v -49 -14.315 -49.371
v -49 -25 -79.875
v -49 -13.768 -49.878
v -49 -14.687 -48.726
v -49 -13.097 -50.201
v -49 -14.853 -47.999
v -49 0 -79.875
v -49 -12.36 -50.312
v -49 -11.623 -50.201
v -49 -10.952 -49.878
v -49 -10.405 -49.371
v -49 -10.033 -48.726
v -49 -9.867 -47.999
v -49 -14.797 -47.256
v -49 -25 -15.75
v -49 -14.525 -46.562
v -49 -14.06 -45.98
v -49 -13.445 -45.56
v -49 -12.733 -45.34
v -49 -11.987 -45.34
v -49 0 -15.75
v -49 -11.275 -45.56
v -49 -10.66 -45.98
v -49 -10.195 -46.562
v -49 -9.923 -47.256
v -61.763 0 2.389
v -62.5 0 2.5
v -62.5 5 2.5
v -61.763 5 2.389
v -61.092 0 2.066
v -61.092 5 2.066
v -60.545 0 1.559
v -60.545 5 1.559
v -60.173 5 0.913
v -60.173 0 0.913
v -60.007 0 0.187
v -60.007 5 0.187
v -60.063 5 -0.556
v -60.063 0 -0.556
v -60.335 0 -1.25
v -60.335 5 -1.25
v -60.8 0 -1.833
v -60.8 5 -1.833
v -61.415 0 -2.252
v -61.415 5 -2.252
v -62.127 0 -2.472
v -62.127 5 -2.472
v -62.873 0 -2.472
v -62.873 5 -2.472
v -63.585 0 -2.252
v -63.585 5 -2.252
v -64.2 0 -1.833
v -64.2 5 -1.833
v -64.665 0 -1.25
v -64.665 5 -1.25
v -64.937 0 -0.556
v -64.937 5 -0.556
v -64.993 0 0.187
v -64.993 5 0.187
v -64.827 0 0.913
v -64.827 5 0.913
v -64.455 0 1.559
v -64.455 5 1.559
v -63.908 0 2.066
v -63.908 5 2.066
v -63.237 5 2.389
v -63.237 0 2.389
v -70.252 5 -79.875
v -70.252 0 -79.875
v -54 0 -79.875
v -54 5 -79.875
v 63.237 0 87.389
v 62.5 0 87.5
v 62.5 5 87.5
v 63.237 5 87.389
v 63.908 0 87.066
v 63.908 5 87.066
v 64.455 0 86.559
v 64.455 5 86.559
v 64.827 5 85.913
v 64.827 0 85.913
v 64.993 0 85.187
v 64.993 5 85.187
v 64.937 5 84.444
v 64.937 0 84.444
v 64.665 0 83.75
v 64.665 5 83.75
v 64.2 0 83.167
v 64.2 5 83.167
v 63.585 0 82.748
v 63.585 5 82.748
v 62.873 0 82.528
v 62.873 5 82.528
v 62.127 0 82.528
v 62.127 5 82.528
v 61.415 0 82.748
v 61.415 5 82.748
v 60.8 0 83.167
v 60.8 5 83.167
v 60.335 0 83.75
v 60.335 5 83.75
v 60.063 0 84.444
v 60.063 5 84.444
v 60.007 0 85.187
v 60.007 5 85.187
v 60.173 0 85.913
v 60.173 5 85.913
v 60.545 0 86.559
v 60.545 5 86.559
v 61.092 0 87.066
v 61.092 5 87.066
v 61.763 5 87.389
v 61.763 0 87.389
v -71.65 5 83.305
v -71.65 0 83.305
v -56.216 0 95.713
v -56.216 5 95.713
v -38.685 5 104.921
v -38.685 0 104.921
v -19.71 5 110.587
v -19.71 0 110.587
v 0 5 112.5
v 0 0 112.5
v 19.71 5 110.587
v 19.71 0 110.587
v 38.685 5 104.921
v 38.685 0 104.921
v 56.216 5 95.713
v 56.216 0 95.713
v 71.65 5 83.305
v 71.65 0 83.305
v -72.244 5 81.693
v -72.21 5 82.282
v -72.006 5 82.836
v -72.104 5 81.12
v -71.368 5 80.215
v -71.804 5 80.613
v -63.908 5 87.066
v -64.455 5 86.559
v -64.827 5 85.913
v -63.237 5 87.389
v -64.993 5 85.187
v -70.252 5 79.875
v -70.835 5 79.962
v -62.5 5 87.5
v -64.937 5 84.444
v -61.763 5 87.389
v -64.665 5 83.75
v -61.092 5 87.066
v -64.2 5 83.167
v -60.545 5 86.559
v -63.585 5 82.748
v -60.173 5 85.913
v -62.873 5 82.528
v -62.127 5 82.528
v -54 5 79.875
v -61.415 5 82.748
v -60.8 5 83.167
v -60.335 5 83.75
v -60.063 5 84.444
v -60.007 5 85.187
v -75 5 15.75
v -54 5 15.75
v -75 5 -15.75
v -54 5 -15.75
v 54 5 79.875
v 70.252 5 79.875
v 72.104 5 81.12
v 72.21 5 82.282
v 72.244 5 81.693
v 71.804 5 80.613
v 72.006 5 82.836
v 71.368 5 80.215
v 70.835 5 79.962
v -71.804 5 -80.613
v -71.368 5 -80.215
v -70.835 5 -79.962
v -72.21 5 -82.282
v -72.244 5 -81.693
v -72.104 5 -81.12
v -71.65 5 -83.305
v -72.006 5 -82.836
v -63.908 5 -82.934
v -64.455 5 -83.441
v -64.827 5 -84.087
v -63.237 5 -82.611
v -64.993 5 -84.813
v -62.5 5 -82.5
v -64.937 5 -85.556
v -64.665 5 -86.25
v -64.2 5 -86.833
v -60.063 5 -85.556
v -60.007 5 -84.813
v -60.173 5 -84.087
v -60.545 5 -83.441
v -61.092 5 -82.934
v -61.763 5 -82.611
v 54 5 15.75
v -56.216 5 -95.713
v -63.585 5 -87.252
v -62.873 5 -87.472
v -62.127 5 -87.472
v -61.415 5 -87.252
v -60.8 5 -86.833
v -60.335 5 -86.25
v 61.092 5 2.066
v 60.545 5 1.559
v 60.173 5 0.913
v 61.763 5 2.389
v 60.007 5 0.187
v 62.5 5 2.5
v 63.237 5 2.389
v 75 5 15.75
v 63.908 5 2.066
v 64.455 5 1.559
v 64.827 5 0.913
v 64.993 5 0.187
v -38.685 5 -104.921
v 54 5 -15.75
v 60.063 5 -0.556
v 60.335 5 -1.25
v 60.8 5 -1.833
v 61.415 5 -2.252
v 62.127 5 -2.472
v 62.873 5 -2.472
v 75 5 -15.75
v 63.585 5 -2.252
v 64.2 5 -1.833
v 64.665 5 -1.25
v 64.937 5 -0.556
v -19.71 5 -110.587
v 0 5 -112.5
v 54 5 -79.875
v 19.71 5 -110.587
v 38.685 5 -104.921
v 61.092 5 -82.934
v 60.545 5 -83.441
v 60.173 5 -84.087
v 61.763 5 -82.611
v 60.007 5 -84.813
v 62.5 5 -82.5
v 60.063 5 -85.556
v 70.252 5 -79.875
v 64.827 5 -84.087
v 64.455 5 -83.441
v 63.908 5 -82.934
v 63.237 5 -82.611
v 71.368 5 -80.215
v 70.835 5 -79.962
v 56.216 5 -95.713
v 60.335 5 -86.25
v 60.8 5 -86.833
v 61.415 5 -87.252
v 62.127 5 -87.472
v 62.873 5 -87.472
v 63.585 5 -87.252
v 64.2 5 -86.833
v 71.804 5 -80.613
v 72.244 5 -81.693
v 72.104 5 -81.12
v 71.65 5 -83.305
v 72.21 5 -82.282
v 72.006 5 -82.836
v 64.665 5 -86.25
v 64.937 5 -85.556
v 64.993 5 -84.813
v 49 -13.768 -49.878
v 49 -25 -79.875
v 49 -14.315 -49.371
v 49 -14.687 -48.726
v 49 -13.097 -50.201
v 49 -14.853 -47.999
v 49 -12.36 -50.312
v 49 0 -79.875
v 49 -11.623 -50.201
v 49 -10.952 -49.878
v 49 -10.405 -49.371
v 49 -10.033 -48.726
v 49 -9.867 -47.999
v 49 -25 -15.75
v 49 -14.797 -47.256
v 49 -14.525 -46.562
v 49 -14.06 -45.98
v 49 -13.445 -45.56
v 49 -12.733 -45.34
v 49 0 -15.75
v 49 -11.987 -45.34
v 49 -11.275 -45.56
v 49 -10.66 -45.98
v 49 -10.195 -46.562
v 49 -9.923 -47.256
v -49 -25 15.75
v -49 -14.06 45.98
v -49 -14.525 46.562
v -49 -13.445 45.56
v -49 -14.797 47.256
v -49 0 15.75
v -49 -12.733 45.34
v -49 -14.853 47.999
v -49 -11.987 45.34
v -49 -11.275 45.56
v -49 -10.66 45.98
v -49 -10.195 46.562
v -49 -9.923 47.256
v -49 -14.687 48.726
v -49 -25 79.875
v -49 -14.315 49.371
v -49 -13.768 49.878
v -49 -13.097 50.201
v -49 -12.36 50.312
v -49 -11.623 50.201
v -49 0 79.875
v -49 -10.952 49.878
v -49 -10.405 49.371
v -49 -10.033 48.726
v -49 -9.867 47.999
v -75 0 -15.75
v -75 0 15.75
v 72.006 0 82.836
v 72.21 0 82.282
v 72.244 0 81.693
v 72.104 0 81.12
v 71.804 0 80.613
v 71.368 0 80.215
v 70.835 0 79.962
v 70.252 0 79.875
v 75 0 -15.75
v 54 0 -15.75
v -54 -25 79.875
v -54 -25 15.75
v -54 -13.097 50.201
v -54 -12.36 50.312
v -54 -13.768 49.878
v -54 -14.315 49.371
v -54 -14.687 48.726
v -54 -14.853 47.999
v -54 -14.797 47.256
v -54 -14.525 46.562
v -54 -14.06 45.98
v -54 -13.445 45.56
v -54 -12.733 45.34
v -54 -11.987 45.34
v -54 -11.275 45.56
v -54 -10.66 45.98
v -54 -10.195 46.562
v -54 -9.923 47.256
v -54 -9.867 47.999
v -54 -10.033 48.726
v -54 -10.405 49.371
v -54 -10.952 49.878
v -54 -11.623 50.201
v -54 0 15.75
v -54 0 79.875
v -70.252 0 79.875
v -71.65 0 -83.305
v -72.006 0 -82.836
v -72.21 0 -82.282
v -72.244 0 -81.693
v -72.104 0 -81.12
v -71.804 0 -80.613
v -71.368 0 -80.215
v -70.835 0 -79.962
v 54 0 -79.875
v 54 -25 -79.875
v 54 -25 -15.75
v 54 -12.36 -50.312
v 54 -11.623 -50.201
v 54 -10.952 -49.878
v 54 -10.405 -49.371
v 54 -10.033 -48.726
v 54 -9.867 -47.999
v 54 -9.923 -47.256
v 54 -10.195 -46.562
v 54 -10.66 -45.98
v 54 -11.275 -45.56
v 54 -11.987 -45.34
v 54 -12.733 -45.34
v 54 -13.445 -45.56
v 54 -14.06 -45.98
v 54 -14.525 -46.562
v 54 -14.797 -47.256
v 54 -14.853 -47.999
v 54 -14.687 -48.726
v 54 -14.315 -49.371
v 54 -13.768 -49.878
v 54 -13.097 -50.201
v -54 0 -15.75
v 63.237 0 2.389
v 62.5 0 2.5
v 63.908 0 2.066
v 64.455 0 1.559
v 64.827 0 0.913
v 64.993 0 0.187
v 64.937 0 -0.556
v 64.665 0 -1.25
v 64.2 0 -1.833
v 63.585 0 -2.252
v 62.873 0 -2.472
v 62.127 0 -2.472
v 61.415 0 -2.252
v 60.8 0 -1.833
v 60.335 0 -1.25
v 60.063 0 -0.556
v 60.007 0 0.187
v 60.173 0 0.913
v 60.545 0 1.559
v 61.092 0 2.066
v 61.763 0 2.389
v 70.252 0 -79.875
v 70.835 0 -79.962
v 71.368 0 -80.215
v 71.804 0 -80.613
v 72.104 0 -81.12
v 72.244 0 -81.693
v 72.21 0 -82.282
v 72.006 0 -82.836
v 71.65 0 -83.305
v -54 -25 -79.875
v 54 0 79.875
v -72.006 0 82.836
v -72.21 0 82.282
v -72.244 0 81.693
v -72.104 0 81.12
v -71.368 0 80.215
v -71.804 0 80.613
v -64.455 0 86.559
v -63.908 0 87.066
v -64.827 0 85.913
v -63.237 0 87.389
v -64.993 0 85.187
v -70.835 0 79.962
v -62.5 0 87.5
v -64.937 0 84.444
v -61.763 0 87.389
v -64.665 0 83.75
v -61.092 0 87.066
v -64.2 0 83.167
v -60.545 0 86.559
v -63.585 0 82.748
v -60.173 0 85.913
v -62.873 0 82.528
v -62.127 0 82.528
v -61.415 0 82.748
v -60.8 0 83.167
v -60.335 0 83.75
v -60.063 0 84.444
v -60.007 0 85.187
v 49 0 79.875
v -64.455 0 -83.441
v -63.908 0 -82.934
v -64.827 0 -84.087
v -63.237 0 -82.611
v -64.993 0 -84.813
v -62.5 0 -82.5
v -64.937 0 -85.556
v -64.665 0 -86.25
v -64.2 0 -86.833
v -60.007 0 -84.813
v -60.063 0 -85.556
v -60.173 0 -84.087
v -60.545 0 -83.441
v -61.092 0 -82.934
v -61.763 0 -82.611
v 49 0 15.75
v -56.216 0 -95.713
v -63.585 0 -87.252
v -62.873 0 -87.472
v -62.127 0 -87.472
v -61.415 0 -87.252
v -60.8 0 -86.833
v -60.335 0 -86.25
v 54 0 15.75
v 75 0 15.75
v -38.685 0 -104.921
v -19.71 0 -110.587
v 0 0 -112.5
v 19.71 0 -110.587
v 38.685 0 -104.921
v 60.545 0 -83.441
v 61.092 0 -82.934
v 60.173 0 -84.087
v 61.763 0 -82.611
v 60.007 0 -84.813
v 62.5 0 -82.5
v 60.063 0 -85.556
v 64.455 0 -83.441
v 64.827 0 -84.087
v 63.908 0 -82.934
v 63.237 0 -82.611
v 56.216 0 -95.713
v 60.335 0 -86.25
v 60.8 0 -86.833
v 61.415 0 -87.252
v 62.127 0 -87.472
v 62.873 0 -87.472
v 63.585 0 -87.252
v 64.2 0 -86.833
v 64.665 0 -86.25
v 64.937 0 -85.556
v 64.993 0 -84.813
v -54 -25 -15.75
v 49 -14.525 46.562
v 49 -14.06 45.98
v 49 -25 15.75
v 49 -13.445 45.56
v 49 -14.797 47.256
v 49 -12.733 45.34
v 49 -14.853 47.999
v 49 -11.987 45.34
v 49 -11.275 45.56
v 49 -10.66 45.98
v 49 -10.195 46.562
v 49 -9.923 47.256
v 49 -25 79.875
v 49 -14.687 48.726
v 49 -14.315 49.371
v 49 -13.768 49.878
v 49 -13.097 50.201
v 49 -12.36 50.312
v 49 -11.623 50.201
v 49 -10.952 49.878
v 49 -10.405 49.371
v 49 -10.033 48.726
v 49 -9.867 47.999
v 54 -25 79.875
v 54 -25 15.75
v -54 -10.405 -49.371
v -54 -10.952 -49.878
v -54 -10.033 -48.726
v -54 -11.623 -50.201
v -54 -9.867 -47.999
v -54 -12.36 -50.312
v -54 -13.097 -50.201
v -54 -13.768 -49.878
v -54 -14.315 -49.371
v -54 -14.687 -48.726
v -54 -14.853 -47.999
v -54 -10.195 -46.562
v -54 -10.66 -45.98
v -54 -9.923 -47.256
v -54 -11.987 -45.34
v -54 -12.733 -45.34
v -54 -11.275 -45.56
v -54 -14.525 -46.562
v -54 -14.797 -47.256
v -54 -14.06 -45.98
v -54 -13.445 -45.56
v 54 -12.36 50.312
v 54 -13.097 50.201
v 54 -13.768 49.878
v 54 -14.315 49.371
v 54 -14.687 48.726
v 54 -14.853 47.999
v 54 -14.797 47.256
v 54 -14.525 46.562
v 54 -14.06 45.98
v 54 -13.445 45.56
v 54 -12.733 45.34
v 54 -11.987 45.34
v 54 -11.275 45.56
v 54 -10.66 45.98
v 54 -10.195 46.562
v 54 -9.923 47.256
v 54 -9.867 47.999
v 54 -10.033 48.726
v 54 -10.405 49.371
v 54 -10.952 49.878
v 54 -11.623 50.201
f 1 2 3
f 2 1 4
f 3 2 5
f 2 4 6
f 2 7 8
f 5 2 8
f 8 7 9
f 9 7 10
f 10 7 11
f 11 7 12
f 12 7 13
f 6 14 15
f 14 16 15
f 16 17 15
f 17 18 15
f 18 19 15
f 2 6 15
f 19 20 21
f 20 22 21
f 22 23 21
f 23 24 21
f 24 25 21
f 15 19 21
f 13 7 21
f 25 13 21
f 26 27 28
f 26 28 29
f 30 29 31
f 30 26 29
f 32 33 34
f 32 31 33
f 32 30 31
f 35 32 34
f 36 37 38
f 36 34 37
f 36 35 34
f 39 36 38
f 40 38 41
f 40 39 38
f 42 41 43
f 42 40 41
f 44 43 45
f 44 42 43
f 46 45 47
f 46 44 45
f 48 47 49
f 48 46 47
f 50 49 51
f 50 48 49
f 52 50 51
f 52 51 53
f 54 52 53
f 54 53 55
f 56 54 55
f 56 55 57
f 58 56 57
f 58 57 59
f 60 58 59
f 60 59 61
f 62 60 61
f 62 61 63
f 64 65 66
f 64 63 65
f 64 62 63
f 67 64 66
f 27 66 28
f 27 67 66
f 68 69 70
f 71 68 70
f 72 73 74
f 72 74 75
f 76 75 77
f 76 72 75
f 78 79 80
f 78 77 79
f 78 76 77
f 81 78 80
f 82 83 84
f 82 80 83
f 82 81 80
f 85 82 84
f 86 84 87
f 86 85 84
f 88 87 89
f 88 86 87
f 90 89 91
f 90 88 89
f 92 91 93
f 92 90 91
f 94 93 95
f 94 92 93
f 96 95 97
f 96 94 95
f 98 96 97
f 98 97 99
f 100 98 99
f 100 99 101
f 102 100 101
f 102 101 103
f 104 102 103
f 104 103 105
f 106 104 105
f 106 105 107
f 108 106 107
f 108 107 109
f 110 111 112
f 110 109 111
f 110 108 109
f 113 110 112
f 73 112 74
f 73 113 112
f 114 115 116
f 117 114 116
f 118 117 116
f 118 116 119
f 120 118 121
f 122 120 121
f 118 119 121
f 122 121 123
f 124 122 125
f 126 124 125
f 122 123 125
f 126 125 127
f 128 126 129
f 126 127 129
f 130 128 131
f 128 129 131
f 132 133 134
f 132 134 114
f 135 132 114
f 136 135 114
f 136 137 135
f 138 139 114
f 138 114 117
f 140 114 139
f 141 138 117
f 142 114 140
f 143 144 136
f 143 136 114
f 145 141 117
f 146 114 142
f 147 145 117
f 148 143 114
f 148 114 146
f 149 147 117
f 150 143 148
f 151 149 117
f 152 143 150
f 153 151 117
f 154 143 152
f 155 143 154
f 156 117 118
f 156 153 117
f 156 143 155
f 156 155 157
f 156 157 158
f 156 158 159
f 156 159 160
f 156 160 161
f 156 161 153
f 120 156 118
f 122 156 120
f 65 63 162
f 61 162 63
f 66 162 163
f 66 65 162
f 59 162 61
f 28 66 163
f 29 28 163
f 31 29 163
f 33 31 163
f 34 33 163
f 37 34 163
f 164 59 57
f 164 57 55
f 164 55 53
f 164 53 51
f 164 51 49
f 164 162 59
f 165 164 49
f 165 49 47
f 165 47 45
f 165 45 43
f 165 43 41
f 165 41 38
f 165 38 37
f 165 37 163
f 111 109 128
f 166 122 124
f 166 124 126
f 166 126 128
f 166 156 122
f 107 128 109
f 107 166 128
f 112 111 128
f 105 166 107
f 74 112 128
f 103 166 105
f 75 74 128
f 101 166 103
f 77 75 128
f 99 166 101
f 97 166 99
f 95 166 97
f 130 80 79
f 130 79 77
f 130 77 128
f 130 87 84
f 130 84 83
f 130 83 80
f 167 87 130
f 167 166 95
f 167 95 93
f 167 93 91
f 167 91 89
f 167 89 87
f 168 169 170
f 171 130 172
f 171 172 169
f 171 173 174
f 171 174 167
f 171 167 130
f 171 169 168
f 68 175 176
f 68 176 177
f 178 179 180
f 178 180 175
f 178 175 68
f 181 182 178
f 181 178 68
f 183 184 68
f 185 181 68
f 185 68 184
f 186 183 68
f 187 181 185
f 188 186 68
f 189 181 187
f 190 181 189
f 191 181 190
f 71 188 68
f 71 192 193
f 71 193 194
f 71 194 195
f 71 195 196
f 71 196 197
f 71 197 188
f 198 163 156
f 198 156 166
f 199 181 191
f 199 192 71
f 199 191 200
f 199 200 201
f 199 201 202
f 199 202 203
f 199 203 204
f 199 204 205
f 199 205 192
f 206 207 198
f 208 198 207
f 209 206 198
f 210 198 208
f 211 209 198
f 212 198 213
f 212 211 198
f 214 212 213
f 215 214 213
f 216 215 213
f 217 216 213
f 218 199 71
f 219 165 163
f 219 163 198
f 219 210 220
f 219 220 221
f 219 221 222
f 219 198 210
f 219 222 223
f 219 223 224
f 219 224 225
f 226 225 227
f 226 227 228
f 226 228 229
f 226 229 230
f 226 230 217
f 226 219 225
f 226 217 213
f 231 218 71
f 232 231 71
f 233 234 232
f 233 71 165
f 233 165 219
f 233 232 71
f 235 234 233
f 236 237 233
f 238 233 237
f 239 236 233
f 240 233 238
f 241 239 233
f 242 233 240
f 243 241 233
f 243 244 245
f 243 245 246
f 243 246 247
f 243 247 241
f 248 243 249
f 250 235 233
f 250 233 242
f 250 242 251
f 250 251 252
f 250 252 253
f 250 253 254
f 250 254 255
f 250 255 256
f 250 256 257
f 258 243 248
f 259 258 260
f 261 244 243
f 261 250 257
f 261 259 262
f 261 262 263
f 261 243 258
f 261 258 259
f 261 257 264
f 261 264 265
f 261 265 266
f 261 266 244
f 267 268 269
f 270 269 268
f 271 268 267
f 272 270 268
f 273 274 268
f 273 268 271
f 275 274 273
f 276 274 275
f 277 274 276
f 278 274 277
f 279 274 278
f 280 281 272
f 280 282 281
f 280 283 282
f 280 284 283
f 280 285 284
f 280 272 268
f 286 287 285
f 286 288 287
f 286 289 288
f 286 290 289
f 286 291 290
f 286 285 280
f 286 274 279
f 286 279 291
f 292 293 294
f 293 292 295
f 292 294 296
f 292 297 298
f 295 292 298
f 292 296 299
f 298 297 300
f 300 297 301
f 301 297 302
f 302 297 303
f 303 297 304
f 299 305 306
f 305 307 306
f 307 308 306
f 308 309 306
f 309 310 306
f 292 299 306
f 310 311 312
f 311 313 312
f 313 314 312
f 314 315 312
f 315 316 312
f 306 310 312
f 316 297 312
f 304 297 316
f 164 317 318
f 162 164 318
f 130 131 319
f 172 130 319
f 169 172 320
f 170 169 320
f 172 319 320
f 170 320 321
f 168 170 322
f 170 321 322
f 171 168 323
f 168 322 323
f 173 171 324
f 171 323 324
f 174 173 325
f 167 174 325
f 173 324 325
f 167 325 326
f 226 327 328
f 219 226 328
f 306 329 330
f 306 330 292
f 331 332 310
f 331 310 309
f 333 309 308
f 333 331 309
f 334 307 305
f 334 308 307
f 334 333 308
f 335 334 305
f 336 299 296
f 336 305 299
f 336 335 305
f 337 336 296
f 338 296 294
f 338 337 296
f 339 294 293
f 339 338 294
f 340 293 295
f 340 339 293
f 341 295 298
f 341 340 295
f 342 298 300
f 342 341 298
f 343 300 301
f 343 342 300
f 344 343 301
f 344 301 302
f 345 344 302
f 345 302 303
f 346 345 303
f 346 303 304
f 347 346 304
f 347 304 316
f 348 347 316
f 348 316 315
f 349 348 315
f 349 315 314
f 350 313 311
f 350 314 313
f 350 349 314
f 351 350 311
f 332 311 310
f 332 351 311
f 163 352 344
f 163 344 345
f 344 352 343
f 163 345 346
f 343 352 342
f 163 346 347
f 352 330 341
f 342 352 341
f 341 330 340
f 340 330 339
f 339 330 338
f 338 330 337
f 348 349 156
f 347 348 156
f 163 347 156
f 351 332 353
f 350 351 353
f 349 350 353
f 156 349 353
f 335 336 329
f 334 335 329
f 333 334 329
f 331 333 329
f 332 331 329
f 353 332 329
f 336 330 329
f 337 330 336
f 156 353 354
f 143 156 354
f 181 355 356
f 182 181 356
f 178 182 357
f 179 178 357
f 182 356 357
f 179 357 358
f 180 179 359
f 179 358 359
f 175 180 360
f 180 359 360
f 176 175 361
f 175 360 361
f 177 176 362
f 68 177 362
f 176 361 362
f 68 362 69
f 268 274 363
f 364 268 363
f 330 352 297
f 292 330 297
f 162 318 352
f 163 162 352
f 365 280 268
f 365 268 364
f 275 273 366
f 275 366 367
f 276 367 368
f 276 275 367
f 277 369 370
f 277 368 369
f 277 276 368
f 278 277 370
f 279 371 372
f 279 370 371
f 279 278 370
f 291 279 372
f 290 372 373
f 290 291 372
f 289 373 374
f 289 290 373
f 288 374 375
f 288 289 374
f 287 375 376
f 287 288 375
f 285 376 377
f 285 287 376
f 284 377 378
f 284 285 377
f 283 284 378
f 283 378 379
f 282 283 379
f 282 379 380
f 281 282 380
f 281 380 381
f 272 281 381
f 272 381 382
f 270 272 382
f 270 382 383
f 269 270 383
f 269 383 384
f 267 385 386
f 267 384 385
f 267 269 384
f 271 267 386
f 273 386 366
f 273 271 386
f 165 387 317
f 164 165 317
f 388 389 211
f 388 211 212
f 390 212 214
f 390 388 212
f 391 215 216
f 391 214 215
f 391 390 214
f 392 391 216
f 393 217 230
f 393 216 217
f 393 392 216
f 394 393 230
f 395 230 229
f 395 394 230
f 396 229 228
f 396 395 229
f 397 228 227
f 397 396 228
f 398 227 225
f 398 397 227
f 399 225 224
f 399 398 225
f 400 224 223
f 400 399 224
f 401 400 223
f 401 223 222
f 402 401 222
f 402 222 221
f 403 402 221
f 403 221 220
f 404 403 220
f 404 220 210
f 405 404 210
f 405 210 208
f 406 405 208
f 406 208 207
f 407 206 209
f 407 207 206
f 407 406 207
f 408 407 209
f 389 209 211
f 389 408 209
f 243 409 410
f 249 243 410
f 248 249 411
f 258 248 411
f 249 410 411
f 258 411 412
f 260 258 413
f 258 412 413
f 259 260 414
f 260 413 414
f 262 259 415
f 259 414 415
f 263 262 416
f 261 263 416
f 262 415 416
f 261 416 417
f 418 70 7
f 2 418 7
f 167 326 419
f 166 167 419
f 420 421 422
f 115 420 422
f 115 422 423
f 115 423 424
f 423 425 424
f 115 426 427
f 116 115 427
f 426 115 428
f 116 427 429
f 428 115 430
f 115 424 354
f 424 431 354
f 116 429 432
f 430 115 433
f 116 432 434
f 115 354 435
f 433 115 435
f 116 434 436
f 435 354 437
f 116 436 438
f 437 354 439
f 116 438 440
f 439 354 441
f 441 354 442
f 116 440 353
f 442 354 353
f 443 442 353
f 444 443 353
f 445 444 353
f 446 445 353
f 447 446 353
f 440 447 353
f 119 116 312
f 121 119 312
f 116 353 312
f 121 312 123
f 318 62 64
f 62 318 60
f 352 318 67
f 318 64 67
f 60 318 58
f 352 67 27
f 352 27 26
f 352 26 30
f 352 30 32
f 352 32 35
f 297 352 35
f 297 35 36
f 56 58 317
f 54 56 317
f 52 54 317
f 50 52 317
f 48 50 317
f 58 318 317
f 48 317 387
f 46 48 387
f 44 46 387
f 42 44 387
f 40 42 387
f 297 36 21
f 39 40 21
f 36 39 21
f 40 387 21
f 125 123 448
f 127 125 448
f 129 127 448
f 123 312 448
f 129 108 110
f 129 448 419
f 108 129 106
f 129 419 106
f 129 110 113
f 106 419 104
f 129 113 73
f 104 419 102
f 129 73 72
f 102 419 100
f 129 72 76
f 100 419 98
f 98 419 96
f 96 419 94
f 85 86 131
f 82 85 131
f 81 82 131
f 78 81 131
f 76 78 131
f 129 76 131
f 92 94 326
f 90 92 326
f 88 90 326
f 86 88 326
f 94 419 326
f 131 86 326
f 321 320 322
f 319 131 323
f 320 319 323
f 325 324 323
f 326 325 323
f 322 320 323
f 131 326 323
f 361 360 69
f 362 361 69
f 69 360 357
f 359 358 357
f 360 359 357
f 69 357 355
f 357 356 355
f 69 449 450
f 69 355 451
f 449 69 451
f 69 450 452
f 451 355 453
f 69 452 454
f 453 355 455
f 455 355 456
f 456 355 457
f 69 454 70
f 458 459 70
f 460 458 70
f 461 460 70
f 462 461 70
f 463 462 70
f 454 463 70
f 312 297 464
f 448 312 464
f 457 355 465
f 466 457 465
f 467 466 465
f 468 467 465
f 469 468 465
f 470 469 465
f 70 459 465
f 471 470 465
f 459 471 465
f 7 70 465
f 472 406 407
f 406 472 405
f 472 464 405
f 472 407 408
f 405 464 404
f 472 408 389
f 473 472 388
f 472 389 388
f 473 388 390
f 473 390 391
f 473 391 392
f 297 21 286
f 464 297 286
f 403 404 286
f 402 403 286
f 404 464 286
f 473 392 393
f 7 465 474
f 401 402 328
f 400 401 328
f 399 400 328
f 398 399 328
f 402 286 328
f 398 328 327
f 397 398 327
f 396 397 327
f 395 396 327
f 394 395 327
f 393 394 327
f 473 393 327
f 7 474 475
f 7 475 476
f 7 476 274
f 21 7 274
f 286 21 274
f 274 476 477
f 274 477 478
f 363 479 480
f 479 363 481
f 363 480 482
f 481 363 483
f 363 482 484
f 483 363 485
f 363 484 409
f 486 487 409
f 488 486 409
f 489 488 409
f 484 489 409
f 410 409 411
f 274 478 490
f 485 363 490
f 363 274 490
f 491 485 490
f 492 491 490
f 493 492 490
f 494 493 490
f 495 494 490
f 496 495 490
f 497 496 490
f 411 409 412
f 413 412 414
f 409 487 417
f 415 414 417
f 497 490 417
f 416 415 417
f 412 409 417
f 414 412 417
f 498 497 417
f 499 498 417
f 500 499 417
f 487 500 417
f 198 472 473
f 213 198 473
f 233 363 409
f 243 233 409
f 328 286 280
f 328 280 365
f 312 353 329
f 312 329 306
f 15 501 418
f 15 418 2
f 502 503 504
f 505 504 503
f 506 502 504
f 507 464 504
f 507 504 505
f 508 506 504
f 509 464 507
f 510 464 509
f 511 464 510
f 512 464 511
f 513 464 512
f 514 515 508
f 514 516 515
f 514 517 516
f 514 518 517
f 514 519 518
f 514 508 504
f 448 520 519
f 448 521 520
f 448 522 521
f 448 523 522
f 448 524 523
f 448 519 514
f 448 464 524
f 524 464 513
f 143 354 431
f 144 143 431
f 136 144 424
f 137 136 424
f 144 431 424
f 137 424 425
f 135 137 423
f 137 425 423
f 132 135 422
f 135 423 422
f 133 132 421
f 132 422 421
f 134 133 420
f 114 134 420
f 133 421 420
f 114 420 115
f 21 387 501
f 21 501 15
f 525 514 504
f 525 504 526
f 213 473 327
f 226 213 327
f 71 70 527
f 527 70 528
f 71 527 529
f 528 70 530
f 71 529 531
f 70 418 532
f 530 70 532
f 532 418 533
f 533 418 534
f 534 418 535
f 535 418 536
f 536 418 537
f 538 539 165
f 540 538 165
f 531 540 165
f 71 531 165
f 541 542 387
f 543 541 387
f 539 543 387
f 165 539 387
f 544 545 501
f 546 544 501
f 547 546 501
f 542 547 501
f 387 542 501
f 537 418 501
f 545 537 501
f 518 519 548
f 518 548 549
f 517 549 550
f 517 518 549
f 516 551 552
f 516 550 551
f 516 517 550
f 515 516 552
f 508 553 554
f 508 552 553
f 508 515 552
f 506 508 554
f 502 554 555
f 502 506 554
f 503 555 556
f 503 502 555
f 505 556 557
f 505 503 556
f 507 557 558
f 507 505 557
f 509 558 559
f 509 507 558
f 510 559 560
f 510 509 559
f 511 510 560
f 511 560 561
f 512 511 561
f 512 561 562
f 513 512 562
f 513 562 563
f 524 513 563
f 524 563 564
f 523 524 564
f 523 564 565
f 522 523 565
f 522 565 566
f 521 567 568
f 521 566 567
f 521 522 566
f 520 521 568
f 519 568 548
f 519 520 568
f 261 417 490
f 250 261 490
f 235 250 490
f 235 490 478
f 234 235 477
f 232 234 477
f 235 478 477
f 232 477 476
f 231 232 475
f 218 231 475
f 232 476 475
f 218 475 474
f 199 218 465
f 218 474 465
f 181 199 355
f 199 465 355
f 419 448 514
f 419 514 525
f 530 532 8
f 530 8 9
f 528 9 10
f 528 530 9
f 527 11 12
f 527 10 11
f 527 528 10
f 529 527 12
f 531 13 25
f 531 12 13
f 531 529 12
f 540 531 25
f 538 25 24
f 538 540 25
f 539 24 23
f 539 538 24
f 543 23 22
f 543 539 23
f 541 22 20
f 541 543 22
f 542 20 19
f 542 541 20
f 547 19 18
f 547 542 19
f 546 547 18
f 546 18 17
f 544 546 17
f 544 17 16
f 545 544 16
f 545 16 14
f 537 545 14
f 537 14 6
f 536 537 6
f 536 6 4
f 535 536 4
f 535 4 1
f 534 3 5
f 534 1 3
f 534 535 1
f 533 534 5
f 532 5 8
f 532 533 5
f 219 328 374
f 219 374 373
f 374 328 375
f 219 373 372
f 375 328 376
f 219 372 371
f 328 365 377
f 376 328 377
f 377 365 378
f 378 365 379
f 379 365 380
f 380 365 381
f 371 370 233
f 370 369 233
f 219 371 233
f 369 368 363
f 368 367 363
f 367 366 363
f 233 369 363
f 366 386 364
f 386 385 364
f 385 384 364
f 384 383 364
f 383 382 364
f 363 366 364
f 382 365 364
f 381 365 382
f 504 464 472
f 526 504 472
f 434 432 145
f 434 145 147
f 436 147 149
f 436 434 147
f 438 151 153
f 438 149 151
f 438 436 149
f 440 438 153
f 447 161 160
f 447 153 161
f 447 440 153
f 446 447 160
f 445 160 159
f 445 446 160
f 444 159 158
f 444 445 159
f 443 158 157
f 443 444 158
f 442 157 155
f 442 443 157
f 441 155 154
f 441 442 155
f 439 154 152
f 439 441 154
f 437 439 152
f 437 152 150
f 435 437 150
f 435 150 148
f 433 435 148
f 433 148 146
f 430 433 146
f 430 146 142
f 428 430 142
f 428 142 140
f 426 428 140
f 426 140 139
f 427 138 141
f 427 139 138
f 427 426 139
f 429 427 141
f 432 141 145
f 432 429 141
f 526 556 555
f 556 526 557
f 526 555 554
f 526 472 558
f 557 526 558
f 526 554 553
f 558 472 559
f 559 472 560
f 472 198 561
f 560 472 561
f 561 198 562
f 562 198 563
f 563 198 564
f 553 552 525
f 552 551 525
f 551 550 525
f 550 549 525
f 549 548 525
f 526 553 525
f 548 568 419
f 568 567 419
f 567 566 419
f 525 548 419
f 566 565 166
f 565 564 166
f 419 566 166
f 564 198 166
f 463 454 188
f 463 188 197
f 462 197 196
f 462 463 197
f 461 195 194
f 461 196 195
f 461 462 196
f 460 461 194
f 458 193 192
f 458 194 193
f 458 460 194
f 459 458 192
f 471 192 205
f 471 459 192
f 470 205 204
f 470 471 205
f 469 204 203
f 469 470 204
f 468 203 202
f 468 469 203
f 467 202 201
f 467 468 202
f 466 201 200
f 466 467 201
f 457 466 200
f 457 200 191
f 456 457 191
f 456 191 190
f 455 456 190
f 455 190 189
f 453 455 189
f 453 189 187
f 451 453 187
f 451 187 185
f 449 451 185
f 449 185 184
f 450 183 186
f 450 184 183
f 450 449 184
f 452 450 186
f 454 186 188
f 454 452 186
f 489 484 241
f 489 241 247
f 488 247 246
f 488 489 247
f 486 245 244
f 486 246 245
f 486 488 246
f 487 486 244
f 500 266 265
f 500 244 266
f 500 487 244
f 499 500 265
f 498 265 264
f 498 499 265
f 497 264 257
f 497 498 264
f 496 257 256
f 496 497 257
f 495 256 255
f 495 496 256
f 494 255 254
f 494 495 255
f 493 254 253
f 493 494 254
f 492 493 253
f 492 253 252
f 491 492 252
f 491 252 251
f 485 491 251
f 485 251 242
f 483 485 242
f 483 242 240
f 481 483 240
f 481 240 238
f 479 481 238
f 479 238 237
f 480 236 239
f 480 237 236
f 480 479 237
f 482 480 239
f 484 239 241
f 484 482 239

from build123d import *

# Parameters (mm, degrees)
BOSS_EXTRUDE1_DEPTH     = 5
SKETCH2_W               = 5
SKETCH2_H               = 64.125
BOSS_EXTRUDE2_DEPTH     = 25
CUT_EXTRUDE1_DEPTH      = 173.980490229
CUT_EXTRUDE1_DEPTH_BACK = 173.980490229
SKETCH3_R               = 2.5
CUT_EXTRUDE2_DEPTH      = 139.496389845
CUT_EXTRUDE2_DEPTH_BACK = 139.496389845
SKETCH4_R               = 2.5


with BuildPart() as part:
    # Sketch1 → Boss-Extrude1 (new body)
    with BuildSketch(Plane(origin=(0, 0, 0), x_dir=(1, 0, 0), z_dir=(0, 1, 0))):
        with BuildLine():
            Line((-75, 15.75), (-75, -15.75))
            Line((-75, -15.75), (-54, -15.75))
            Line((-54, -15.75), (-54, -79.875))
            Line((-54, -79.875), (-70.25200942, -79.875))
            ThreePointArc((-70.25200942, -79.875), (-72.104159031, -81.120320055), (-71.649789587, -83.305458181))
            ThreePointArc((-71.649789587, -83.305458181), (0, -112.5), (71.649789587, -83.305458181))
            ThreePointArc((71.649789587, -83.305458181), (72.104159031, -81.120320055), (70.25200942, -79.875))
            Line((70.25200942, -79.875), (54, -79.875))
            Line((54, -79.875), (54, -15.75))
            Line((54, -15.75), (75, -15.75))
            Line((75, -15.75), (75, 0))
            Line((75, 0), (75, 15.75))
            Line((75, 15.75), (54, 15.75))
            Line((54, 15.75), (54, 79.875))
            Line((54, 79.875), (70.25200942, 79.875))
            ThreePointArc((70.25200942, 79.875), (72.104159031, 81.120320055), (71.649789587, 83.305458181))
            ThreePointArc((71.649789587, 83.305458181), (0, 112.5), (-71.649789587, 83.305458181))
            ThreePointArc((-71.649789587, 83.305458181), (-72.104159031, 81.120320055), (-70.25200942, 79.875))
            Line((-70.25200942, 79.875), (-54, 79.875))
            Line((-54, 79.875), (-54, 15.75))
            Line((-54, 15.75), (-75, 15.75))
        make_face()
    extrude(amount=BOSS_EXTRUDE1_DEPTH)

    # Sketch2 → Boss-Extrude2 (add)
    with BuildSketch(Plane.XZ):
        with Locations((51.5, 47.8125)):
            Rectangle(SKETCH2_W, SKETCH2_H)
        with Locations((-51.5, 47.8125)):
            Rectangle(SKETCH2_W, SKETCH2_H)
        with Locations((-51.5, -47.8125)):
            Rectangle(SKETCH2_W, SKETCH2_H)
        with Locations((51.5, -47.8125)):
            Rectangle(SKETCH2_W, SKETCH2_H)
    extrude(amount=BOSS_EXTRUDE2_DEPTH)

    # Sketch3 → Cut-Extrude1 (cut, two sides: drawn at the far end of the back side and taken through both)
    with BuildSketch(Plane(origin=(54, 0, 0), x_dir=(0, 0, -1), z_dir=(1, 0, 0)).offset(-CUT_EXTRUDE1_DEPTH_BACK)):
        with Locations(Location((-47.8125, -12.36, 0), (0, 0, 180))):
            Circle(SKETCH3_R)
        with Locations((47.8125, -12.36)):
            Circle(SKETCH3_R)
    extrude(amount=CUT_EXTRUDE1_DEPTH + CUT_EXTRUDE1_DEPTH_BACK, mode=Mode.SUBTRACT)

    # Sketch4 → Cut-Extrude2 (cut, two sides: drawn at the far end of the back side and taken through both)
    with BuildSketch(Plane(origin=(0, 5, 0), x_dir=(1, 0, 0), z_dir=(0, 1, 0)).offset(-CUT_EXTRUDE2_DEPTH_BACK)):
        with Locations(Location((-62.5, 85, 0), (0, 0, 270))):
            Circle(SKETCH4_R)
        with Locations(Location((62.5, 85, 0), (0, 0, 270))):
            Circle(SKETCH4_R)
        with Locations(Location((62.5, 0, 0), (0, 0, 270))):
            Circle(SKETCH4_R)
        with Locations(Location((62.5, -85, 0), (0, 0, 270))):
            Circle(SKETCH4_R)
        with Locations(Location((-62.5, 0, 0), (0, 0, 270))):
            Circle(SKETCH4_R)
        with Locations(Location((-62.5, -85, 0), (0, 0, 270))):
            Circle(SKETCH4_R)
    extrude(amount=CUT_EXTRUDE2_DEPTH + CUT_EXTRUDE2_DEPTH_BACK, mode=Mode.SUBTRACT)


solid = part.part
